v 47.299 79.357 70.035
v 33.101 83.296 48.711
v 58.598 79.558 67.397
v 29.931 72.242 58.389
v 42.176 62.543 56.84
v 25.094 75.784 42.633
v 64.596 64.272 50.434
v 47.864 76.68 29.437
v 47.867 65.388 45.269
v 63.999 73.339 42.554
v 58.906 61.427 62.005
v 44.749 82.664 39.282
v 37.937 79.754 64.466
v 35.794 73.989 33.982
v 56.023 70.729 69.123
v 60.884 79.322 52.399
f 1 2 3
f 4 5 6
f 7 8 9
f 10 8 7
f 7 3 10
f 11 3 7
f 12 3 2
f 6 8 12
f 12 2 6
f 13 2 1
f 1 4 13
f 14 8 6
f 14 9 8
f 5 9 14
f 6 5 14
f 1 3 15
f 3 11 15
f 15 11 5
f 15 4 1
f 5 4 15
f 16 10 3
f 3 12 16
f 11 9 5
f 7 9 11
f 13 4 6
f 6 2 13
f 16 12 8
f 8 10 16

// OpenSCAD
// Auto-generated auxetic polyhedron
points = [
    [58.598158, 79.558068, 67.397033],
    [33.100519, 83.296141, 48.710726],
    [47.299191, 79.357222, 70.035383],
    [25.094206, 75.783898, 42.632982],
    [42.176271, 62.542773, 56.840072],
    [29.930752, 72.241674, 58.388554],
    [47.866830, 65.388116, 45.269245],
    [47.863808, 76.680104, 29.436812],
    [64.596495, 64.272213, 50.434293],
    [63.999320, 73.338726, 42.554033],
    [58.905936, 61.426869, 62.005120],
    [44.748864, 82.663753, 39.281985],
    [37.937064, 79.753917, 64.466297],
    [35.793720, 73.988760, 33.981896],
    [56.022543, 70.729075, 69.122687],
    [60.884376, 79.322375, 52.399206],
];

faces = [
    [0, 1, 2],
    [3, 4, 5],
    [6, 7, 8],
    [8, 7, 9],
    [9, 0, 8],
    [8, 0, 10],
    [1, 0, 11],
    [11, 7, 3],
    [3, 1, 11],
    [2, 1, 12],
    [12, 5, 2],
    [3, 7, 13],
    [7, 6, 13],
    [13, 6, 4],
    [13, 4, 3],
    [14, 0, 2],
    [14, 10, 0],
    [4, 10, 14],
    [2, 5, 14],
    [14, 5, 4],
    [0, 9, 15],
    [15, 11, 0],
    [4, 6, 10],
    [10, 6, 8],
    [3, 5, 12],
    [12, 1, 3],
    [7, 11, 15],
    [15, 9, 7],
];

polyhedron(points = points, faces = faces);
